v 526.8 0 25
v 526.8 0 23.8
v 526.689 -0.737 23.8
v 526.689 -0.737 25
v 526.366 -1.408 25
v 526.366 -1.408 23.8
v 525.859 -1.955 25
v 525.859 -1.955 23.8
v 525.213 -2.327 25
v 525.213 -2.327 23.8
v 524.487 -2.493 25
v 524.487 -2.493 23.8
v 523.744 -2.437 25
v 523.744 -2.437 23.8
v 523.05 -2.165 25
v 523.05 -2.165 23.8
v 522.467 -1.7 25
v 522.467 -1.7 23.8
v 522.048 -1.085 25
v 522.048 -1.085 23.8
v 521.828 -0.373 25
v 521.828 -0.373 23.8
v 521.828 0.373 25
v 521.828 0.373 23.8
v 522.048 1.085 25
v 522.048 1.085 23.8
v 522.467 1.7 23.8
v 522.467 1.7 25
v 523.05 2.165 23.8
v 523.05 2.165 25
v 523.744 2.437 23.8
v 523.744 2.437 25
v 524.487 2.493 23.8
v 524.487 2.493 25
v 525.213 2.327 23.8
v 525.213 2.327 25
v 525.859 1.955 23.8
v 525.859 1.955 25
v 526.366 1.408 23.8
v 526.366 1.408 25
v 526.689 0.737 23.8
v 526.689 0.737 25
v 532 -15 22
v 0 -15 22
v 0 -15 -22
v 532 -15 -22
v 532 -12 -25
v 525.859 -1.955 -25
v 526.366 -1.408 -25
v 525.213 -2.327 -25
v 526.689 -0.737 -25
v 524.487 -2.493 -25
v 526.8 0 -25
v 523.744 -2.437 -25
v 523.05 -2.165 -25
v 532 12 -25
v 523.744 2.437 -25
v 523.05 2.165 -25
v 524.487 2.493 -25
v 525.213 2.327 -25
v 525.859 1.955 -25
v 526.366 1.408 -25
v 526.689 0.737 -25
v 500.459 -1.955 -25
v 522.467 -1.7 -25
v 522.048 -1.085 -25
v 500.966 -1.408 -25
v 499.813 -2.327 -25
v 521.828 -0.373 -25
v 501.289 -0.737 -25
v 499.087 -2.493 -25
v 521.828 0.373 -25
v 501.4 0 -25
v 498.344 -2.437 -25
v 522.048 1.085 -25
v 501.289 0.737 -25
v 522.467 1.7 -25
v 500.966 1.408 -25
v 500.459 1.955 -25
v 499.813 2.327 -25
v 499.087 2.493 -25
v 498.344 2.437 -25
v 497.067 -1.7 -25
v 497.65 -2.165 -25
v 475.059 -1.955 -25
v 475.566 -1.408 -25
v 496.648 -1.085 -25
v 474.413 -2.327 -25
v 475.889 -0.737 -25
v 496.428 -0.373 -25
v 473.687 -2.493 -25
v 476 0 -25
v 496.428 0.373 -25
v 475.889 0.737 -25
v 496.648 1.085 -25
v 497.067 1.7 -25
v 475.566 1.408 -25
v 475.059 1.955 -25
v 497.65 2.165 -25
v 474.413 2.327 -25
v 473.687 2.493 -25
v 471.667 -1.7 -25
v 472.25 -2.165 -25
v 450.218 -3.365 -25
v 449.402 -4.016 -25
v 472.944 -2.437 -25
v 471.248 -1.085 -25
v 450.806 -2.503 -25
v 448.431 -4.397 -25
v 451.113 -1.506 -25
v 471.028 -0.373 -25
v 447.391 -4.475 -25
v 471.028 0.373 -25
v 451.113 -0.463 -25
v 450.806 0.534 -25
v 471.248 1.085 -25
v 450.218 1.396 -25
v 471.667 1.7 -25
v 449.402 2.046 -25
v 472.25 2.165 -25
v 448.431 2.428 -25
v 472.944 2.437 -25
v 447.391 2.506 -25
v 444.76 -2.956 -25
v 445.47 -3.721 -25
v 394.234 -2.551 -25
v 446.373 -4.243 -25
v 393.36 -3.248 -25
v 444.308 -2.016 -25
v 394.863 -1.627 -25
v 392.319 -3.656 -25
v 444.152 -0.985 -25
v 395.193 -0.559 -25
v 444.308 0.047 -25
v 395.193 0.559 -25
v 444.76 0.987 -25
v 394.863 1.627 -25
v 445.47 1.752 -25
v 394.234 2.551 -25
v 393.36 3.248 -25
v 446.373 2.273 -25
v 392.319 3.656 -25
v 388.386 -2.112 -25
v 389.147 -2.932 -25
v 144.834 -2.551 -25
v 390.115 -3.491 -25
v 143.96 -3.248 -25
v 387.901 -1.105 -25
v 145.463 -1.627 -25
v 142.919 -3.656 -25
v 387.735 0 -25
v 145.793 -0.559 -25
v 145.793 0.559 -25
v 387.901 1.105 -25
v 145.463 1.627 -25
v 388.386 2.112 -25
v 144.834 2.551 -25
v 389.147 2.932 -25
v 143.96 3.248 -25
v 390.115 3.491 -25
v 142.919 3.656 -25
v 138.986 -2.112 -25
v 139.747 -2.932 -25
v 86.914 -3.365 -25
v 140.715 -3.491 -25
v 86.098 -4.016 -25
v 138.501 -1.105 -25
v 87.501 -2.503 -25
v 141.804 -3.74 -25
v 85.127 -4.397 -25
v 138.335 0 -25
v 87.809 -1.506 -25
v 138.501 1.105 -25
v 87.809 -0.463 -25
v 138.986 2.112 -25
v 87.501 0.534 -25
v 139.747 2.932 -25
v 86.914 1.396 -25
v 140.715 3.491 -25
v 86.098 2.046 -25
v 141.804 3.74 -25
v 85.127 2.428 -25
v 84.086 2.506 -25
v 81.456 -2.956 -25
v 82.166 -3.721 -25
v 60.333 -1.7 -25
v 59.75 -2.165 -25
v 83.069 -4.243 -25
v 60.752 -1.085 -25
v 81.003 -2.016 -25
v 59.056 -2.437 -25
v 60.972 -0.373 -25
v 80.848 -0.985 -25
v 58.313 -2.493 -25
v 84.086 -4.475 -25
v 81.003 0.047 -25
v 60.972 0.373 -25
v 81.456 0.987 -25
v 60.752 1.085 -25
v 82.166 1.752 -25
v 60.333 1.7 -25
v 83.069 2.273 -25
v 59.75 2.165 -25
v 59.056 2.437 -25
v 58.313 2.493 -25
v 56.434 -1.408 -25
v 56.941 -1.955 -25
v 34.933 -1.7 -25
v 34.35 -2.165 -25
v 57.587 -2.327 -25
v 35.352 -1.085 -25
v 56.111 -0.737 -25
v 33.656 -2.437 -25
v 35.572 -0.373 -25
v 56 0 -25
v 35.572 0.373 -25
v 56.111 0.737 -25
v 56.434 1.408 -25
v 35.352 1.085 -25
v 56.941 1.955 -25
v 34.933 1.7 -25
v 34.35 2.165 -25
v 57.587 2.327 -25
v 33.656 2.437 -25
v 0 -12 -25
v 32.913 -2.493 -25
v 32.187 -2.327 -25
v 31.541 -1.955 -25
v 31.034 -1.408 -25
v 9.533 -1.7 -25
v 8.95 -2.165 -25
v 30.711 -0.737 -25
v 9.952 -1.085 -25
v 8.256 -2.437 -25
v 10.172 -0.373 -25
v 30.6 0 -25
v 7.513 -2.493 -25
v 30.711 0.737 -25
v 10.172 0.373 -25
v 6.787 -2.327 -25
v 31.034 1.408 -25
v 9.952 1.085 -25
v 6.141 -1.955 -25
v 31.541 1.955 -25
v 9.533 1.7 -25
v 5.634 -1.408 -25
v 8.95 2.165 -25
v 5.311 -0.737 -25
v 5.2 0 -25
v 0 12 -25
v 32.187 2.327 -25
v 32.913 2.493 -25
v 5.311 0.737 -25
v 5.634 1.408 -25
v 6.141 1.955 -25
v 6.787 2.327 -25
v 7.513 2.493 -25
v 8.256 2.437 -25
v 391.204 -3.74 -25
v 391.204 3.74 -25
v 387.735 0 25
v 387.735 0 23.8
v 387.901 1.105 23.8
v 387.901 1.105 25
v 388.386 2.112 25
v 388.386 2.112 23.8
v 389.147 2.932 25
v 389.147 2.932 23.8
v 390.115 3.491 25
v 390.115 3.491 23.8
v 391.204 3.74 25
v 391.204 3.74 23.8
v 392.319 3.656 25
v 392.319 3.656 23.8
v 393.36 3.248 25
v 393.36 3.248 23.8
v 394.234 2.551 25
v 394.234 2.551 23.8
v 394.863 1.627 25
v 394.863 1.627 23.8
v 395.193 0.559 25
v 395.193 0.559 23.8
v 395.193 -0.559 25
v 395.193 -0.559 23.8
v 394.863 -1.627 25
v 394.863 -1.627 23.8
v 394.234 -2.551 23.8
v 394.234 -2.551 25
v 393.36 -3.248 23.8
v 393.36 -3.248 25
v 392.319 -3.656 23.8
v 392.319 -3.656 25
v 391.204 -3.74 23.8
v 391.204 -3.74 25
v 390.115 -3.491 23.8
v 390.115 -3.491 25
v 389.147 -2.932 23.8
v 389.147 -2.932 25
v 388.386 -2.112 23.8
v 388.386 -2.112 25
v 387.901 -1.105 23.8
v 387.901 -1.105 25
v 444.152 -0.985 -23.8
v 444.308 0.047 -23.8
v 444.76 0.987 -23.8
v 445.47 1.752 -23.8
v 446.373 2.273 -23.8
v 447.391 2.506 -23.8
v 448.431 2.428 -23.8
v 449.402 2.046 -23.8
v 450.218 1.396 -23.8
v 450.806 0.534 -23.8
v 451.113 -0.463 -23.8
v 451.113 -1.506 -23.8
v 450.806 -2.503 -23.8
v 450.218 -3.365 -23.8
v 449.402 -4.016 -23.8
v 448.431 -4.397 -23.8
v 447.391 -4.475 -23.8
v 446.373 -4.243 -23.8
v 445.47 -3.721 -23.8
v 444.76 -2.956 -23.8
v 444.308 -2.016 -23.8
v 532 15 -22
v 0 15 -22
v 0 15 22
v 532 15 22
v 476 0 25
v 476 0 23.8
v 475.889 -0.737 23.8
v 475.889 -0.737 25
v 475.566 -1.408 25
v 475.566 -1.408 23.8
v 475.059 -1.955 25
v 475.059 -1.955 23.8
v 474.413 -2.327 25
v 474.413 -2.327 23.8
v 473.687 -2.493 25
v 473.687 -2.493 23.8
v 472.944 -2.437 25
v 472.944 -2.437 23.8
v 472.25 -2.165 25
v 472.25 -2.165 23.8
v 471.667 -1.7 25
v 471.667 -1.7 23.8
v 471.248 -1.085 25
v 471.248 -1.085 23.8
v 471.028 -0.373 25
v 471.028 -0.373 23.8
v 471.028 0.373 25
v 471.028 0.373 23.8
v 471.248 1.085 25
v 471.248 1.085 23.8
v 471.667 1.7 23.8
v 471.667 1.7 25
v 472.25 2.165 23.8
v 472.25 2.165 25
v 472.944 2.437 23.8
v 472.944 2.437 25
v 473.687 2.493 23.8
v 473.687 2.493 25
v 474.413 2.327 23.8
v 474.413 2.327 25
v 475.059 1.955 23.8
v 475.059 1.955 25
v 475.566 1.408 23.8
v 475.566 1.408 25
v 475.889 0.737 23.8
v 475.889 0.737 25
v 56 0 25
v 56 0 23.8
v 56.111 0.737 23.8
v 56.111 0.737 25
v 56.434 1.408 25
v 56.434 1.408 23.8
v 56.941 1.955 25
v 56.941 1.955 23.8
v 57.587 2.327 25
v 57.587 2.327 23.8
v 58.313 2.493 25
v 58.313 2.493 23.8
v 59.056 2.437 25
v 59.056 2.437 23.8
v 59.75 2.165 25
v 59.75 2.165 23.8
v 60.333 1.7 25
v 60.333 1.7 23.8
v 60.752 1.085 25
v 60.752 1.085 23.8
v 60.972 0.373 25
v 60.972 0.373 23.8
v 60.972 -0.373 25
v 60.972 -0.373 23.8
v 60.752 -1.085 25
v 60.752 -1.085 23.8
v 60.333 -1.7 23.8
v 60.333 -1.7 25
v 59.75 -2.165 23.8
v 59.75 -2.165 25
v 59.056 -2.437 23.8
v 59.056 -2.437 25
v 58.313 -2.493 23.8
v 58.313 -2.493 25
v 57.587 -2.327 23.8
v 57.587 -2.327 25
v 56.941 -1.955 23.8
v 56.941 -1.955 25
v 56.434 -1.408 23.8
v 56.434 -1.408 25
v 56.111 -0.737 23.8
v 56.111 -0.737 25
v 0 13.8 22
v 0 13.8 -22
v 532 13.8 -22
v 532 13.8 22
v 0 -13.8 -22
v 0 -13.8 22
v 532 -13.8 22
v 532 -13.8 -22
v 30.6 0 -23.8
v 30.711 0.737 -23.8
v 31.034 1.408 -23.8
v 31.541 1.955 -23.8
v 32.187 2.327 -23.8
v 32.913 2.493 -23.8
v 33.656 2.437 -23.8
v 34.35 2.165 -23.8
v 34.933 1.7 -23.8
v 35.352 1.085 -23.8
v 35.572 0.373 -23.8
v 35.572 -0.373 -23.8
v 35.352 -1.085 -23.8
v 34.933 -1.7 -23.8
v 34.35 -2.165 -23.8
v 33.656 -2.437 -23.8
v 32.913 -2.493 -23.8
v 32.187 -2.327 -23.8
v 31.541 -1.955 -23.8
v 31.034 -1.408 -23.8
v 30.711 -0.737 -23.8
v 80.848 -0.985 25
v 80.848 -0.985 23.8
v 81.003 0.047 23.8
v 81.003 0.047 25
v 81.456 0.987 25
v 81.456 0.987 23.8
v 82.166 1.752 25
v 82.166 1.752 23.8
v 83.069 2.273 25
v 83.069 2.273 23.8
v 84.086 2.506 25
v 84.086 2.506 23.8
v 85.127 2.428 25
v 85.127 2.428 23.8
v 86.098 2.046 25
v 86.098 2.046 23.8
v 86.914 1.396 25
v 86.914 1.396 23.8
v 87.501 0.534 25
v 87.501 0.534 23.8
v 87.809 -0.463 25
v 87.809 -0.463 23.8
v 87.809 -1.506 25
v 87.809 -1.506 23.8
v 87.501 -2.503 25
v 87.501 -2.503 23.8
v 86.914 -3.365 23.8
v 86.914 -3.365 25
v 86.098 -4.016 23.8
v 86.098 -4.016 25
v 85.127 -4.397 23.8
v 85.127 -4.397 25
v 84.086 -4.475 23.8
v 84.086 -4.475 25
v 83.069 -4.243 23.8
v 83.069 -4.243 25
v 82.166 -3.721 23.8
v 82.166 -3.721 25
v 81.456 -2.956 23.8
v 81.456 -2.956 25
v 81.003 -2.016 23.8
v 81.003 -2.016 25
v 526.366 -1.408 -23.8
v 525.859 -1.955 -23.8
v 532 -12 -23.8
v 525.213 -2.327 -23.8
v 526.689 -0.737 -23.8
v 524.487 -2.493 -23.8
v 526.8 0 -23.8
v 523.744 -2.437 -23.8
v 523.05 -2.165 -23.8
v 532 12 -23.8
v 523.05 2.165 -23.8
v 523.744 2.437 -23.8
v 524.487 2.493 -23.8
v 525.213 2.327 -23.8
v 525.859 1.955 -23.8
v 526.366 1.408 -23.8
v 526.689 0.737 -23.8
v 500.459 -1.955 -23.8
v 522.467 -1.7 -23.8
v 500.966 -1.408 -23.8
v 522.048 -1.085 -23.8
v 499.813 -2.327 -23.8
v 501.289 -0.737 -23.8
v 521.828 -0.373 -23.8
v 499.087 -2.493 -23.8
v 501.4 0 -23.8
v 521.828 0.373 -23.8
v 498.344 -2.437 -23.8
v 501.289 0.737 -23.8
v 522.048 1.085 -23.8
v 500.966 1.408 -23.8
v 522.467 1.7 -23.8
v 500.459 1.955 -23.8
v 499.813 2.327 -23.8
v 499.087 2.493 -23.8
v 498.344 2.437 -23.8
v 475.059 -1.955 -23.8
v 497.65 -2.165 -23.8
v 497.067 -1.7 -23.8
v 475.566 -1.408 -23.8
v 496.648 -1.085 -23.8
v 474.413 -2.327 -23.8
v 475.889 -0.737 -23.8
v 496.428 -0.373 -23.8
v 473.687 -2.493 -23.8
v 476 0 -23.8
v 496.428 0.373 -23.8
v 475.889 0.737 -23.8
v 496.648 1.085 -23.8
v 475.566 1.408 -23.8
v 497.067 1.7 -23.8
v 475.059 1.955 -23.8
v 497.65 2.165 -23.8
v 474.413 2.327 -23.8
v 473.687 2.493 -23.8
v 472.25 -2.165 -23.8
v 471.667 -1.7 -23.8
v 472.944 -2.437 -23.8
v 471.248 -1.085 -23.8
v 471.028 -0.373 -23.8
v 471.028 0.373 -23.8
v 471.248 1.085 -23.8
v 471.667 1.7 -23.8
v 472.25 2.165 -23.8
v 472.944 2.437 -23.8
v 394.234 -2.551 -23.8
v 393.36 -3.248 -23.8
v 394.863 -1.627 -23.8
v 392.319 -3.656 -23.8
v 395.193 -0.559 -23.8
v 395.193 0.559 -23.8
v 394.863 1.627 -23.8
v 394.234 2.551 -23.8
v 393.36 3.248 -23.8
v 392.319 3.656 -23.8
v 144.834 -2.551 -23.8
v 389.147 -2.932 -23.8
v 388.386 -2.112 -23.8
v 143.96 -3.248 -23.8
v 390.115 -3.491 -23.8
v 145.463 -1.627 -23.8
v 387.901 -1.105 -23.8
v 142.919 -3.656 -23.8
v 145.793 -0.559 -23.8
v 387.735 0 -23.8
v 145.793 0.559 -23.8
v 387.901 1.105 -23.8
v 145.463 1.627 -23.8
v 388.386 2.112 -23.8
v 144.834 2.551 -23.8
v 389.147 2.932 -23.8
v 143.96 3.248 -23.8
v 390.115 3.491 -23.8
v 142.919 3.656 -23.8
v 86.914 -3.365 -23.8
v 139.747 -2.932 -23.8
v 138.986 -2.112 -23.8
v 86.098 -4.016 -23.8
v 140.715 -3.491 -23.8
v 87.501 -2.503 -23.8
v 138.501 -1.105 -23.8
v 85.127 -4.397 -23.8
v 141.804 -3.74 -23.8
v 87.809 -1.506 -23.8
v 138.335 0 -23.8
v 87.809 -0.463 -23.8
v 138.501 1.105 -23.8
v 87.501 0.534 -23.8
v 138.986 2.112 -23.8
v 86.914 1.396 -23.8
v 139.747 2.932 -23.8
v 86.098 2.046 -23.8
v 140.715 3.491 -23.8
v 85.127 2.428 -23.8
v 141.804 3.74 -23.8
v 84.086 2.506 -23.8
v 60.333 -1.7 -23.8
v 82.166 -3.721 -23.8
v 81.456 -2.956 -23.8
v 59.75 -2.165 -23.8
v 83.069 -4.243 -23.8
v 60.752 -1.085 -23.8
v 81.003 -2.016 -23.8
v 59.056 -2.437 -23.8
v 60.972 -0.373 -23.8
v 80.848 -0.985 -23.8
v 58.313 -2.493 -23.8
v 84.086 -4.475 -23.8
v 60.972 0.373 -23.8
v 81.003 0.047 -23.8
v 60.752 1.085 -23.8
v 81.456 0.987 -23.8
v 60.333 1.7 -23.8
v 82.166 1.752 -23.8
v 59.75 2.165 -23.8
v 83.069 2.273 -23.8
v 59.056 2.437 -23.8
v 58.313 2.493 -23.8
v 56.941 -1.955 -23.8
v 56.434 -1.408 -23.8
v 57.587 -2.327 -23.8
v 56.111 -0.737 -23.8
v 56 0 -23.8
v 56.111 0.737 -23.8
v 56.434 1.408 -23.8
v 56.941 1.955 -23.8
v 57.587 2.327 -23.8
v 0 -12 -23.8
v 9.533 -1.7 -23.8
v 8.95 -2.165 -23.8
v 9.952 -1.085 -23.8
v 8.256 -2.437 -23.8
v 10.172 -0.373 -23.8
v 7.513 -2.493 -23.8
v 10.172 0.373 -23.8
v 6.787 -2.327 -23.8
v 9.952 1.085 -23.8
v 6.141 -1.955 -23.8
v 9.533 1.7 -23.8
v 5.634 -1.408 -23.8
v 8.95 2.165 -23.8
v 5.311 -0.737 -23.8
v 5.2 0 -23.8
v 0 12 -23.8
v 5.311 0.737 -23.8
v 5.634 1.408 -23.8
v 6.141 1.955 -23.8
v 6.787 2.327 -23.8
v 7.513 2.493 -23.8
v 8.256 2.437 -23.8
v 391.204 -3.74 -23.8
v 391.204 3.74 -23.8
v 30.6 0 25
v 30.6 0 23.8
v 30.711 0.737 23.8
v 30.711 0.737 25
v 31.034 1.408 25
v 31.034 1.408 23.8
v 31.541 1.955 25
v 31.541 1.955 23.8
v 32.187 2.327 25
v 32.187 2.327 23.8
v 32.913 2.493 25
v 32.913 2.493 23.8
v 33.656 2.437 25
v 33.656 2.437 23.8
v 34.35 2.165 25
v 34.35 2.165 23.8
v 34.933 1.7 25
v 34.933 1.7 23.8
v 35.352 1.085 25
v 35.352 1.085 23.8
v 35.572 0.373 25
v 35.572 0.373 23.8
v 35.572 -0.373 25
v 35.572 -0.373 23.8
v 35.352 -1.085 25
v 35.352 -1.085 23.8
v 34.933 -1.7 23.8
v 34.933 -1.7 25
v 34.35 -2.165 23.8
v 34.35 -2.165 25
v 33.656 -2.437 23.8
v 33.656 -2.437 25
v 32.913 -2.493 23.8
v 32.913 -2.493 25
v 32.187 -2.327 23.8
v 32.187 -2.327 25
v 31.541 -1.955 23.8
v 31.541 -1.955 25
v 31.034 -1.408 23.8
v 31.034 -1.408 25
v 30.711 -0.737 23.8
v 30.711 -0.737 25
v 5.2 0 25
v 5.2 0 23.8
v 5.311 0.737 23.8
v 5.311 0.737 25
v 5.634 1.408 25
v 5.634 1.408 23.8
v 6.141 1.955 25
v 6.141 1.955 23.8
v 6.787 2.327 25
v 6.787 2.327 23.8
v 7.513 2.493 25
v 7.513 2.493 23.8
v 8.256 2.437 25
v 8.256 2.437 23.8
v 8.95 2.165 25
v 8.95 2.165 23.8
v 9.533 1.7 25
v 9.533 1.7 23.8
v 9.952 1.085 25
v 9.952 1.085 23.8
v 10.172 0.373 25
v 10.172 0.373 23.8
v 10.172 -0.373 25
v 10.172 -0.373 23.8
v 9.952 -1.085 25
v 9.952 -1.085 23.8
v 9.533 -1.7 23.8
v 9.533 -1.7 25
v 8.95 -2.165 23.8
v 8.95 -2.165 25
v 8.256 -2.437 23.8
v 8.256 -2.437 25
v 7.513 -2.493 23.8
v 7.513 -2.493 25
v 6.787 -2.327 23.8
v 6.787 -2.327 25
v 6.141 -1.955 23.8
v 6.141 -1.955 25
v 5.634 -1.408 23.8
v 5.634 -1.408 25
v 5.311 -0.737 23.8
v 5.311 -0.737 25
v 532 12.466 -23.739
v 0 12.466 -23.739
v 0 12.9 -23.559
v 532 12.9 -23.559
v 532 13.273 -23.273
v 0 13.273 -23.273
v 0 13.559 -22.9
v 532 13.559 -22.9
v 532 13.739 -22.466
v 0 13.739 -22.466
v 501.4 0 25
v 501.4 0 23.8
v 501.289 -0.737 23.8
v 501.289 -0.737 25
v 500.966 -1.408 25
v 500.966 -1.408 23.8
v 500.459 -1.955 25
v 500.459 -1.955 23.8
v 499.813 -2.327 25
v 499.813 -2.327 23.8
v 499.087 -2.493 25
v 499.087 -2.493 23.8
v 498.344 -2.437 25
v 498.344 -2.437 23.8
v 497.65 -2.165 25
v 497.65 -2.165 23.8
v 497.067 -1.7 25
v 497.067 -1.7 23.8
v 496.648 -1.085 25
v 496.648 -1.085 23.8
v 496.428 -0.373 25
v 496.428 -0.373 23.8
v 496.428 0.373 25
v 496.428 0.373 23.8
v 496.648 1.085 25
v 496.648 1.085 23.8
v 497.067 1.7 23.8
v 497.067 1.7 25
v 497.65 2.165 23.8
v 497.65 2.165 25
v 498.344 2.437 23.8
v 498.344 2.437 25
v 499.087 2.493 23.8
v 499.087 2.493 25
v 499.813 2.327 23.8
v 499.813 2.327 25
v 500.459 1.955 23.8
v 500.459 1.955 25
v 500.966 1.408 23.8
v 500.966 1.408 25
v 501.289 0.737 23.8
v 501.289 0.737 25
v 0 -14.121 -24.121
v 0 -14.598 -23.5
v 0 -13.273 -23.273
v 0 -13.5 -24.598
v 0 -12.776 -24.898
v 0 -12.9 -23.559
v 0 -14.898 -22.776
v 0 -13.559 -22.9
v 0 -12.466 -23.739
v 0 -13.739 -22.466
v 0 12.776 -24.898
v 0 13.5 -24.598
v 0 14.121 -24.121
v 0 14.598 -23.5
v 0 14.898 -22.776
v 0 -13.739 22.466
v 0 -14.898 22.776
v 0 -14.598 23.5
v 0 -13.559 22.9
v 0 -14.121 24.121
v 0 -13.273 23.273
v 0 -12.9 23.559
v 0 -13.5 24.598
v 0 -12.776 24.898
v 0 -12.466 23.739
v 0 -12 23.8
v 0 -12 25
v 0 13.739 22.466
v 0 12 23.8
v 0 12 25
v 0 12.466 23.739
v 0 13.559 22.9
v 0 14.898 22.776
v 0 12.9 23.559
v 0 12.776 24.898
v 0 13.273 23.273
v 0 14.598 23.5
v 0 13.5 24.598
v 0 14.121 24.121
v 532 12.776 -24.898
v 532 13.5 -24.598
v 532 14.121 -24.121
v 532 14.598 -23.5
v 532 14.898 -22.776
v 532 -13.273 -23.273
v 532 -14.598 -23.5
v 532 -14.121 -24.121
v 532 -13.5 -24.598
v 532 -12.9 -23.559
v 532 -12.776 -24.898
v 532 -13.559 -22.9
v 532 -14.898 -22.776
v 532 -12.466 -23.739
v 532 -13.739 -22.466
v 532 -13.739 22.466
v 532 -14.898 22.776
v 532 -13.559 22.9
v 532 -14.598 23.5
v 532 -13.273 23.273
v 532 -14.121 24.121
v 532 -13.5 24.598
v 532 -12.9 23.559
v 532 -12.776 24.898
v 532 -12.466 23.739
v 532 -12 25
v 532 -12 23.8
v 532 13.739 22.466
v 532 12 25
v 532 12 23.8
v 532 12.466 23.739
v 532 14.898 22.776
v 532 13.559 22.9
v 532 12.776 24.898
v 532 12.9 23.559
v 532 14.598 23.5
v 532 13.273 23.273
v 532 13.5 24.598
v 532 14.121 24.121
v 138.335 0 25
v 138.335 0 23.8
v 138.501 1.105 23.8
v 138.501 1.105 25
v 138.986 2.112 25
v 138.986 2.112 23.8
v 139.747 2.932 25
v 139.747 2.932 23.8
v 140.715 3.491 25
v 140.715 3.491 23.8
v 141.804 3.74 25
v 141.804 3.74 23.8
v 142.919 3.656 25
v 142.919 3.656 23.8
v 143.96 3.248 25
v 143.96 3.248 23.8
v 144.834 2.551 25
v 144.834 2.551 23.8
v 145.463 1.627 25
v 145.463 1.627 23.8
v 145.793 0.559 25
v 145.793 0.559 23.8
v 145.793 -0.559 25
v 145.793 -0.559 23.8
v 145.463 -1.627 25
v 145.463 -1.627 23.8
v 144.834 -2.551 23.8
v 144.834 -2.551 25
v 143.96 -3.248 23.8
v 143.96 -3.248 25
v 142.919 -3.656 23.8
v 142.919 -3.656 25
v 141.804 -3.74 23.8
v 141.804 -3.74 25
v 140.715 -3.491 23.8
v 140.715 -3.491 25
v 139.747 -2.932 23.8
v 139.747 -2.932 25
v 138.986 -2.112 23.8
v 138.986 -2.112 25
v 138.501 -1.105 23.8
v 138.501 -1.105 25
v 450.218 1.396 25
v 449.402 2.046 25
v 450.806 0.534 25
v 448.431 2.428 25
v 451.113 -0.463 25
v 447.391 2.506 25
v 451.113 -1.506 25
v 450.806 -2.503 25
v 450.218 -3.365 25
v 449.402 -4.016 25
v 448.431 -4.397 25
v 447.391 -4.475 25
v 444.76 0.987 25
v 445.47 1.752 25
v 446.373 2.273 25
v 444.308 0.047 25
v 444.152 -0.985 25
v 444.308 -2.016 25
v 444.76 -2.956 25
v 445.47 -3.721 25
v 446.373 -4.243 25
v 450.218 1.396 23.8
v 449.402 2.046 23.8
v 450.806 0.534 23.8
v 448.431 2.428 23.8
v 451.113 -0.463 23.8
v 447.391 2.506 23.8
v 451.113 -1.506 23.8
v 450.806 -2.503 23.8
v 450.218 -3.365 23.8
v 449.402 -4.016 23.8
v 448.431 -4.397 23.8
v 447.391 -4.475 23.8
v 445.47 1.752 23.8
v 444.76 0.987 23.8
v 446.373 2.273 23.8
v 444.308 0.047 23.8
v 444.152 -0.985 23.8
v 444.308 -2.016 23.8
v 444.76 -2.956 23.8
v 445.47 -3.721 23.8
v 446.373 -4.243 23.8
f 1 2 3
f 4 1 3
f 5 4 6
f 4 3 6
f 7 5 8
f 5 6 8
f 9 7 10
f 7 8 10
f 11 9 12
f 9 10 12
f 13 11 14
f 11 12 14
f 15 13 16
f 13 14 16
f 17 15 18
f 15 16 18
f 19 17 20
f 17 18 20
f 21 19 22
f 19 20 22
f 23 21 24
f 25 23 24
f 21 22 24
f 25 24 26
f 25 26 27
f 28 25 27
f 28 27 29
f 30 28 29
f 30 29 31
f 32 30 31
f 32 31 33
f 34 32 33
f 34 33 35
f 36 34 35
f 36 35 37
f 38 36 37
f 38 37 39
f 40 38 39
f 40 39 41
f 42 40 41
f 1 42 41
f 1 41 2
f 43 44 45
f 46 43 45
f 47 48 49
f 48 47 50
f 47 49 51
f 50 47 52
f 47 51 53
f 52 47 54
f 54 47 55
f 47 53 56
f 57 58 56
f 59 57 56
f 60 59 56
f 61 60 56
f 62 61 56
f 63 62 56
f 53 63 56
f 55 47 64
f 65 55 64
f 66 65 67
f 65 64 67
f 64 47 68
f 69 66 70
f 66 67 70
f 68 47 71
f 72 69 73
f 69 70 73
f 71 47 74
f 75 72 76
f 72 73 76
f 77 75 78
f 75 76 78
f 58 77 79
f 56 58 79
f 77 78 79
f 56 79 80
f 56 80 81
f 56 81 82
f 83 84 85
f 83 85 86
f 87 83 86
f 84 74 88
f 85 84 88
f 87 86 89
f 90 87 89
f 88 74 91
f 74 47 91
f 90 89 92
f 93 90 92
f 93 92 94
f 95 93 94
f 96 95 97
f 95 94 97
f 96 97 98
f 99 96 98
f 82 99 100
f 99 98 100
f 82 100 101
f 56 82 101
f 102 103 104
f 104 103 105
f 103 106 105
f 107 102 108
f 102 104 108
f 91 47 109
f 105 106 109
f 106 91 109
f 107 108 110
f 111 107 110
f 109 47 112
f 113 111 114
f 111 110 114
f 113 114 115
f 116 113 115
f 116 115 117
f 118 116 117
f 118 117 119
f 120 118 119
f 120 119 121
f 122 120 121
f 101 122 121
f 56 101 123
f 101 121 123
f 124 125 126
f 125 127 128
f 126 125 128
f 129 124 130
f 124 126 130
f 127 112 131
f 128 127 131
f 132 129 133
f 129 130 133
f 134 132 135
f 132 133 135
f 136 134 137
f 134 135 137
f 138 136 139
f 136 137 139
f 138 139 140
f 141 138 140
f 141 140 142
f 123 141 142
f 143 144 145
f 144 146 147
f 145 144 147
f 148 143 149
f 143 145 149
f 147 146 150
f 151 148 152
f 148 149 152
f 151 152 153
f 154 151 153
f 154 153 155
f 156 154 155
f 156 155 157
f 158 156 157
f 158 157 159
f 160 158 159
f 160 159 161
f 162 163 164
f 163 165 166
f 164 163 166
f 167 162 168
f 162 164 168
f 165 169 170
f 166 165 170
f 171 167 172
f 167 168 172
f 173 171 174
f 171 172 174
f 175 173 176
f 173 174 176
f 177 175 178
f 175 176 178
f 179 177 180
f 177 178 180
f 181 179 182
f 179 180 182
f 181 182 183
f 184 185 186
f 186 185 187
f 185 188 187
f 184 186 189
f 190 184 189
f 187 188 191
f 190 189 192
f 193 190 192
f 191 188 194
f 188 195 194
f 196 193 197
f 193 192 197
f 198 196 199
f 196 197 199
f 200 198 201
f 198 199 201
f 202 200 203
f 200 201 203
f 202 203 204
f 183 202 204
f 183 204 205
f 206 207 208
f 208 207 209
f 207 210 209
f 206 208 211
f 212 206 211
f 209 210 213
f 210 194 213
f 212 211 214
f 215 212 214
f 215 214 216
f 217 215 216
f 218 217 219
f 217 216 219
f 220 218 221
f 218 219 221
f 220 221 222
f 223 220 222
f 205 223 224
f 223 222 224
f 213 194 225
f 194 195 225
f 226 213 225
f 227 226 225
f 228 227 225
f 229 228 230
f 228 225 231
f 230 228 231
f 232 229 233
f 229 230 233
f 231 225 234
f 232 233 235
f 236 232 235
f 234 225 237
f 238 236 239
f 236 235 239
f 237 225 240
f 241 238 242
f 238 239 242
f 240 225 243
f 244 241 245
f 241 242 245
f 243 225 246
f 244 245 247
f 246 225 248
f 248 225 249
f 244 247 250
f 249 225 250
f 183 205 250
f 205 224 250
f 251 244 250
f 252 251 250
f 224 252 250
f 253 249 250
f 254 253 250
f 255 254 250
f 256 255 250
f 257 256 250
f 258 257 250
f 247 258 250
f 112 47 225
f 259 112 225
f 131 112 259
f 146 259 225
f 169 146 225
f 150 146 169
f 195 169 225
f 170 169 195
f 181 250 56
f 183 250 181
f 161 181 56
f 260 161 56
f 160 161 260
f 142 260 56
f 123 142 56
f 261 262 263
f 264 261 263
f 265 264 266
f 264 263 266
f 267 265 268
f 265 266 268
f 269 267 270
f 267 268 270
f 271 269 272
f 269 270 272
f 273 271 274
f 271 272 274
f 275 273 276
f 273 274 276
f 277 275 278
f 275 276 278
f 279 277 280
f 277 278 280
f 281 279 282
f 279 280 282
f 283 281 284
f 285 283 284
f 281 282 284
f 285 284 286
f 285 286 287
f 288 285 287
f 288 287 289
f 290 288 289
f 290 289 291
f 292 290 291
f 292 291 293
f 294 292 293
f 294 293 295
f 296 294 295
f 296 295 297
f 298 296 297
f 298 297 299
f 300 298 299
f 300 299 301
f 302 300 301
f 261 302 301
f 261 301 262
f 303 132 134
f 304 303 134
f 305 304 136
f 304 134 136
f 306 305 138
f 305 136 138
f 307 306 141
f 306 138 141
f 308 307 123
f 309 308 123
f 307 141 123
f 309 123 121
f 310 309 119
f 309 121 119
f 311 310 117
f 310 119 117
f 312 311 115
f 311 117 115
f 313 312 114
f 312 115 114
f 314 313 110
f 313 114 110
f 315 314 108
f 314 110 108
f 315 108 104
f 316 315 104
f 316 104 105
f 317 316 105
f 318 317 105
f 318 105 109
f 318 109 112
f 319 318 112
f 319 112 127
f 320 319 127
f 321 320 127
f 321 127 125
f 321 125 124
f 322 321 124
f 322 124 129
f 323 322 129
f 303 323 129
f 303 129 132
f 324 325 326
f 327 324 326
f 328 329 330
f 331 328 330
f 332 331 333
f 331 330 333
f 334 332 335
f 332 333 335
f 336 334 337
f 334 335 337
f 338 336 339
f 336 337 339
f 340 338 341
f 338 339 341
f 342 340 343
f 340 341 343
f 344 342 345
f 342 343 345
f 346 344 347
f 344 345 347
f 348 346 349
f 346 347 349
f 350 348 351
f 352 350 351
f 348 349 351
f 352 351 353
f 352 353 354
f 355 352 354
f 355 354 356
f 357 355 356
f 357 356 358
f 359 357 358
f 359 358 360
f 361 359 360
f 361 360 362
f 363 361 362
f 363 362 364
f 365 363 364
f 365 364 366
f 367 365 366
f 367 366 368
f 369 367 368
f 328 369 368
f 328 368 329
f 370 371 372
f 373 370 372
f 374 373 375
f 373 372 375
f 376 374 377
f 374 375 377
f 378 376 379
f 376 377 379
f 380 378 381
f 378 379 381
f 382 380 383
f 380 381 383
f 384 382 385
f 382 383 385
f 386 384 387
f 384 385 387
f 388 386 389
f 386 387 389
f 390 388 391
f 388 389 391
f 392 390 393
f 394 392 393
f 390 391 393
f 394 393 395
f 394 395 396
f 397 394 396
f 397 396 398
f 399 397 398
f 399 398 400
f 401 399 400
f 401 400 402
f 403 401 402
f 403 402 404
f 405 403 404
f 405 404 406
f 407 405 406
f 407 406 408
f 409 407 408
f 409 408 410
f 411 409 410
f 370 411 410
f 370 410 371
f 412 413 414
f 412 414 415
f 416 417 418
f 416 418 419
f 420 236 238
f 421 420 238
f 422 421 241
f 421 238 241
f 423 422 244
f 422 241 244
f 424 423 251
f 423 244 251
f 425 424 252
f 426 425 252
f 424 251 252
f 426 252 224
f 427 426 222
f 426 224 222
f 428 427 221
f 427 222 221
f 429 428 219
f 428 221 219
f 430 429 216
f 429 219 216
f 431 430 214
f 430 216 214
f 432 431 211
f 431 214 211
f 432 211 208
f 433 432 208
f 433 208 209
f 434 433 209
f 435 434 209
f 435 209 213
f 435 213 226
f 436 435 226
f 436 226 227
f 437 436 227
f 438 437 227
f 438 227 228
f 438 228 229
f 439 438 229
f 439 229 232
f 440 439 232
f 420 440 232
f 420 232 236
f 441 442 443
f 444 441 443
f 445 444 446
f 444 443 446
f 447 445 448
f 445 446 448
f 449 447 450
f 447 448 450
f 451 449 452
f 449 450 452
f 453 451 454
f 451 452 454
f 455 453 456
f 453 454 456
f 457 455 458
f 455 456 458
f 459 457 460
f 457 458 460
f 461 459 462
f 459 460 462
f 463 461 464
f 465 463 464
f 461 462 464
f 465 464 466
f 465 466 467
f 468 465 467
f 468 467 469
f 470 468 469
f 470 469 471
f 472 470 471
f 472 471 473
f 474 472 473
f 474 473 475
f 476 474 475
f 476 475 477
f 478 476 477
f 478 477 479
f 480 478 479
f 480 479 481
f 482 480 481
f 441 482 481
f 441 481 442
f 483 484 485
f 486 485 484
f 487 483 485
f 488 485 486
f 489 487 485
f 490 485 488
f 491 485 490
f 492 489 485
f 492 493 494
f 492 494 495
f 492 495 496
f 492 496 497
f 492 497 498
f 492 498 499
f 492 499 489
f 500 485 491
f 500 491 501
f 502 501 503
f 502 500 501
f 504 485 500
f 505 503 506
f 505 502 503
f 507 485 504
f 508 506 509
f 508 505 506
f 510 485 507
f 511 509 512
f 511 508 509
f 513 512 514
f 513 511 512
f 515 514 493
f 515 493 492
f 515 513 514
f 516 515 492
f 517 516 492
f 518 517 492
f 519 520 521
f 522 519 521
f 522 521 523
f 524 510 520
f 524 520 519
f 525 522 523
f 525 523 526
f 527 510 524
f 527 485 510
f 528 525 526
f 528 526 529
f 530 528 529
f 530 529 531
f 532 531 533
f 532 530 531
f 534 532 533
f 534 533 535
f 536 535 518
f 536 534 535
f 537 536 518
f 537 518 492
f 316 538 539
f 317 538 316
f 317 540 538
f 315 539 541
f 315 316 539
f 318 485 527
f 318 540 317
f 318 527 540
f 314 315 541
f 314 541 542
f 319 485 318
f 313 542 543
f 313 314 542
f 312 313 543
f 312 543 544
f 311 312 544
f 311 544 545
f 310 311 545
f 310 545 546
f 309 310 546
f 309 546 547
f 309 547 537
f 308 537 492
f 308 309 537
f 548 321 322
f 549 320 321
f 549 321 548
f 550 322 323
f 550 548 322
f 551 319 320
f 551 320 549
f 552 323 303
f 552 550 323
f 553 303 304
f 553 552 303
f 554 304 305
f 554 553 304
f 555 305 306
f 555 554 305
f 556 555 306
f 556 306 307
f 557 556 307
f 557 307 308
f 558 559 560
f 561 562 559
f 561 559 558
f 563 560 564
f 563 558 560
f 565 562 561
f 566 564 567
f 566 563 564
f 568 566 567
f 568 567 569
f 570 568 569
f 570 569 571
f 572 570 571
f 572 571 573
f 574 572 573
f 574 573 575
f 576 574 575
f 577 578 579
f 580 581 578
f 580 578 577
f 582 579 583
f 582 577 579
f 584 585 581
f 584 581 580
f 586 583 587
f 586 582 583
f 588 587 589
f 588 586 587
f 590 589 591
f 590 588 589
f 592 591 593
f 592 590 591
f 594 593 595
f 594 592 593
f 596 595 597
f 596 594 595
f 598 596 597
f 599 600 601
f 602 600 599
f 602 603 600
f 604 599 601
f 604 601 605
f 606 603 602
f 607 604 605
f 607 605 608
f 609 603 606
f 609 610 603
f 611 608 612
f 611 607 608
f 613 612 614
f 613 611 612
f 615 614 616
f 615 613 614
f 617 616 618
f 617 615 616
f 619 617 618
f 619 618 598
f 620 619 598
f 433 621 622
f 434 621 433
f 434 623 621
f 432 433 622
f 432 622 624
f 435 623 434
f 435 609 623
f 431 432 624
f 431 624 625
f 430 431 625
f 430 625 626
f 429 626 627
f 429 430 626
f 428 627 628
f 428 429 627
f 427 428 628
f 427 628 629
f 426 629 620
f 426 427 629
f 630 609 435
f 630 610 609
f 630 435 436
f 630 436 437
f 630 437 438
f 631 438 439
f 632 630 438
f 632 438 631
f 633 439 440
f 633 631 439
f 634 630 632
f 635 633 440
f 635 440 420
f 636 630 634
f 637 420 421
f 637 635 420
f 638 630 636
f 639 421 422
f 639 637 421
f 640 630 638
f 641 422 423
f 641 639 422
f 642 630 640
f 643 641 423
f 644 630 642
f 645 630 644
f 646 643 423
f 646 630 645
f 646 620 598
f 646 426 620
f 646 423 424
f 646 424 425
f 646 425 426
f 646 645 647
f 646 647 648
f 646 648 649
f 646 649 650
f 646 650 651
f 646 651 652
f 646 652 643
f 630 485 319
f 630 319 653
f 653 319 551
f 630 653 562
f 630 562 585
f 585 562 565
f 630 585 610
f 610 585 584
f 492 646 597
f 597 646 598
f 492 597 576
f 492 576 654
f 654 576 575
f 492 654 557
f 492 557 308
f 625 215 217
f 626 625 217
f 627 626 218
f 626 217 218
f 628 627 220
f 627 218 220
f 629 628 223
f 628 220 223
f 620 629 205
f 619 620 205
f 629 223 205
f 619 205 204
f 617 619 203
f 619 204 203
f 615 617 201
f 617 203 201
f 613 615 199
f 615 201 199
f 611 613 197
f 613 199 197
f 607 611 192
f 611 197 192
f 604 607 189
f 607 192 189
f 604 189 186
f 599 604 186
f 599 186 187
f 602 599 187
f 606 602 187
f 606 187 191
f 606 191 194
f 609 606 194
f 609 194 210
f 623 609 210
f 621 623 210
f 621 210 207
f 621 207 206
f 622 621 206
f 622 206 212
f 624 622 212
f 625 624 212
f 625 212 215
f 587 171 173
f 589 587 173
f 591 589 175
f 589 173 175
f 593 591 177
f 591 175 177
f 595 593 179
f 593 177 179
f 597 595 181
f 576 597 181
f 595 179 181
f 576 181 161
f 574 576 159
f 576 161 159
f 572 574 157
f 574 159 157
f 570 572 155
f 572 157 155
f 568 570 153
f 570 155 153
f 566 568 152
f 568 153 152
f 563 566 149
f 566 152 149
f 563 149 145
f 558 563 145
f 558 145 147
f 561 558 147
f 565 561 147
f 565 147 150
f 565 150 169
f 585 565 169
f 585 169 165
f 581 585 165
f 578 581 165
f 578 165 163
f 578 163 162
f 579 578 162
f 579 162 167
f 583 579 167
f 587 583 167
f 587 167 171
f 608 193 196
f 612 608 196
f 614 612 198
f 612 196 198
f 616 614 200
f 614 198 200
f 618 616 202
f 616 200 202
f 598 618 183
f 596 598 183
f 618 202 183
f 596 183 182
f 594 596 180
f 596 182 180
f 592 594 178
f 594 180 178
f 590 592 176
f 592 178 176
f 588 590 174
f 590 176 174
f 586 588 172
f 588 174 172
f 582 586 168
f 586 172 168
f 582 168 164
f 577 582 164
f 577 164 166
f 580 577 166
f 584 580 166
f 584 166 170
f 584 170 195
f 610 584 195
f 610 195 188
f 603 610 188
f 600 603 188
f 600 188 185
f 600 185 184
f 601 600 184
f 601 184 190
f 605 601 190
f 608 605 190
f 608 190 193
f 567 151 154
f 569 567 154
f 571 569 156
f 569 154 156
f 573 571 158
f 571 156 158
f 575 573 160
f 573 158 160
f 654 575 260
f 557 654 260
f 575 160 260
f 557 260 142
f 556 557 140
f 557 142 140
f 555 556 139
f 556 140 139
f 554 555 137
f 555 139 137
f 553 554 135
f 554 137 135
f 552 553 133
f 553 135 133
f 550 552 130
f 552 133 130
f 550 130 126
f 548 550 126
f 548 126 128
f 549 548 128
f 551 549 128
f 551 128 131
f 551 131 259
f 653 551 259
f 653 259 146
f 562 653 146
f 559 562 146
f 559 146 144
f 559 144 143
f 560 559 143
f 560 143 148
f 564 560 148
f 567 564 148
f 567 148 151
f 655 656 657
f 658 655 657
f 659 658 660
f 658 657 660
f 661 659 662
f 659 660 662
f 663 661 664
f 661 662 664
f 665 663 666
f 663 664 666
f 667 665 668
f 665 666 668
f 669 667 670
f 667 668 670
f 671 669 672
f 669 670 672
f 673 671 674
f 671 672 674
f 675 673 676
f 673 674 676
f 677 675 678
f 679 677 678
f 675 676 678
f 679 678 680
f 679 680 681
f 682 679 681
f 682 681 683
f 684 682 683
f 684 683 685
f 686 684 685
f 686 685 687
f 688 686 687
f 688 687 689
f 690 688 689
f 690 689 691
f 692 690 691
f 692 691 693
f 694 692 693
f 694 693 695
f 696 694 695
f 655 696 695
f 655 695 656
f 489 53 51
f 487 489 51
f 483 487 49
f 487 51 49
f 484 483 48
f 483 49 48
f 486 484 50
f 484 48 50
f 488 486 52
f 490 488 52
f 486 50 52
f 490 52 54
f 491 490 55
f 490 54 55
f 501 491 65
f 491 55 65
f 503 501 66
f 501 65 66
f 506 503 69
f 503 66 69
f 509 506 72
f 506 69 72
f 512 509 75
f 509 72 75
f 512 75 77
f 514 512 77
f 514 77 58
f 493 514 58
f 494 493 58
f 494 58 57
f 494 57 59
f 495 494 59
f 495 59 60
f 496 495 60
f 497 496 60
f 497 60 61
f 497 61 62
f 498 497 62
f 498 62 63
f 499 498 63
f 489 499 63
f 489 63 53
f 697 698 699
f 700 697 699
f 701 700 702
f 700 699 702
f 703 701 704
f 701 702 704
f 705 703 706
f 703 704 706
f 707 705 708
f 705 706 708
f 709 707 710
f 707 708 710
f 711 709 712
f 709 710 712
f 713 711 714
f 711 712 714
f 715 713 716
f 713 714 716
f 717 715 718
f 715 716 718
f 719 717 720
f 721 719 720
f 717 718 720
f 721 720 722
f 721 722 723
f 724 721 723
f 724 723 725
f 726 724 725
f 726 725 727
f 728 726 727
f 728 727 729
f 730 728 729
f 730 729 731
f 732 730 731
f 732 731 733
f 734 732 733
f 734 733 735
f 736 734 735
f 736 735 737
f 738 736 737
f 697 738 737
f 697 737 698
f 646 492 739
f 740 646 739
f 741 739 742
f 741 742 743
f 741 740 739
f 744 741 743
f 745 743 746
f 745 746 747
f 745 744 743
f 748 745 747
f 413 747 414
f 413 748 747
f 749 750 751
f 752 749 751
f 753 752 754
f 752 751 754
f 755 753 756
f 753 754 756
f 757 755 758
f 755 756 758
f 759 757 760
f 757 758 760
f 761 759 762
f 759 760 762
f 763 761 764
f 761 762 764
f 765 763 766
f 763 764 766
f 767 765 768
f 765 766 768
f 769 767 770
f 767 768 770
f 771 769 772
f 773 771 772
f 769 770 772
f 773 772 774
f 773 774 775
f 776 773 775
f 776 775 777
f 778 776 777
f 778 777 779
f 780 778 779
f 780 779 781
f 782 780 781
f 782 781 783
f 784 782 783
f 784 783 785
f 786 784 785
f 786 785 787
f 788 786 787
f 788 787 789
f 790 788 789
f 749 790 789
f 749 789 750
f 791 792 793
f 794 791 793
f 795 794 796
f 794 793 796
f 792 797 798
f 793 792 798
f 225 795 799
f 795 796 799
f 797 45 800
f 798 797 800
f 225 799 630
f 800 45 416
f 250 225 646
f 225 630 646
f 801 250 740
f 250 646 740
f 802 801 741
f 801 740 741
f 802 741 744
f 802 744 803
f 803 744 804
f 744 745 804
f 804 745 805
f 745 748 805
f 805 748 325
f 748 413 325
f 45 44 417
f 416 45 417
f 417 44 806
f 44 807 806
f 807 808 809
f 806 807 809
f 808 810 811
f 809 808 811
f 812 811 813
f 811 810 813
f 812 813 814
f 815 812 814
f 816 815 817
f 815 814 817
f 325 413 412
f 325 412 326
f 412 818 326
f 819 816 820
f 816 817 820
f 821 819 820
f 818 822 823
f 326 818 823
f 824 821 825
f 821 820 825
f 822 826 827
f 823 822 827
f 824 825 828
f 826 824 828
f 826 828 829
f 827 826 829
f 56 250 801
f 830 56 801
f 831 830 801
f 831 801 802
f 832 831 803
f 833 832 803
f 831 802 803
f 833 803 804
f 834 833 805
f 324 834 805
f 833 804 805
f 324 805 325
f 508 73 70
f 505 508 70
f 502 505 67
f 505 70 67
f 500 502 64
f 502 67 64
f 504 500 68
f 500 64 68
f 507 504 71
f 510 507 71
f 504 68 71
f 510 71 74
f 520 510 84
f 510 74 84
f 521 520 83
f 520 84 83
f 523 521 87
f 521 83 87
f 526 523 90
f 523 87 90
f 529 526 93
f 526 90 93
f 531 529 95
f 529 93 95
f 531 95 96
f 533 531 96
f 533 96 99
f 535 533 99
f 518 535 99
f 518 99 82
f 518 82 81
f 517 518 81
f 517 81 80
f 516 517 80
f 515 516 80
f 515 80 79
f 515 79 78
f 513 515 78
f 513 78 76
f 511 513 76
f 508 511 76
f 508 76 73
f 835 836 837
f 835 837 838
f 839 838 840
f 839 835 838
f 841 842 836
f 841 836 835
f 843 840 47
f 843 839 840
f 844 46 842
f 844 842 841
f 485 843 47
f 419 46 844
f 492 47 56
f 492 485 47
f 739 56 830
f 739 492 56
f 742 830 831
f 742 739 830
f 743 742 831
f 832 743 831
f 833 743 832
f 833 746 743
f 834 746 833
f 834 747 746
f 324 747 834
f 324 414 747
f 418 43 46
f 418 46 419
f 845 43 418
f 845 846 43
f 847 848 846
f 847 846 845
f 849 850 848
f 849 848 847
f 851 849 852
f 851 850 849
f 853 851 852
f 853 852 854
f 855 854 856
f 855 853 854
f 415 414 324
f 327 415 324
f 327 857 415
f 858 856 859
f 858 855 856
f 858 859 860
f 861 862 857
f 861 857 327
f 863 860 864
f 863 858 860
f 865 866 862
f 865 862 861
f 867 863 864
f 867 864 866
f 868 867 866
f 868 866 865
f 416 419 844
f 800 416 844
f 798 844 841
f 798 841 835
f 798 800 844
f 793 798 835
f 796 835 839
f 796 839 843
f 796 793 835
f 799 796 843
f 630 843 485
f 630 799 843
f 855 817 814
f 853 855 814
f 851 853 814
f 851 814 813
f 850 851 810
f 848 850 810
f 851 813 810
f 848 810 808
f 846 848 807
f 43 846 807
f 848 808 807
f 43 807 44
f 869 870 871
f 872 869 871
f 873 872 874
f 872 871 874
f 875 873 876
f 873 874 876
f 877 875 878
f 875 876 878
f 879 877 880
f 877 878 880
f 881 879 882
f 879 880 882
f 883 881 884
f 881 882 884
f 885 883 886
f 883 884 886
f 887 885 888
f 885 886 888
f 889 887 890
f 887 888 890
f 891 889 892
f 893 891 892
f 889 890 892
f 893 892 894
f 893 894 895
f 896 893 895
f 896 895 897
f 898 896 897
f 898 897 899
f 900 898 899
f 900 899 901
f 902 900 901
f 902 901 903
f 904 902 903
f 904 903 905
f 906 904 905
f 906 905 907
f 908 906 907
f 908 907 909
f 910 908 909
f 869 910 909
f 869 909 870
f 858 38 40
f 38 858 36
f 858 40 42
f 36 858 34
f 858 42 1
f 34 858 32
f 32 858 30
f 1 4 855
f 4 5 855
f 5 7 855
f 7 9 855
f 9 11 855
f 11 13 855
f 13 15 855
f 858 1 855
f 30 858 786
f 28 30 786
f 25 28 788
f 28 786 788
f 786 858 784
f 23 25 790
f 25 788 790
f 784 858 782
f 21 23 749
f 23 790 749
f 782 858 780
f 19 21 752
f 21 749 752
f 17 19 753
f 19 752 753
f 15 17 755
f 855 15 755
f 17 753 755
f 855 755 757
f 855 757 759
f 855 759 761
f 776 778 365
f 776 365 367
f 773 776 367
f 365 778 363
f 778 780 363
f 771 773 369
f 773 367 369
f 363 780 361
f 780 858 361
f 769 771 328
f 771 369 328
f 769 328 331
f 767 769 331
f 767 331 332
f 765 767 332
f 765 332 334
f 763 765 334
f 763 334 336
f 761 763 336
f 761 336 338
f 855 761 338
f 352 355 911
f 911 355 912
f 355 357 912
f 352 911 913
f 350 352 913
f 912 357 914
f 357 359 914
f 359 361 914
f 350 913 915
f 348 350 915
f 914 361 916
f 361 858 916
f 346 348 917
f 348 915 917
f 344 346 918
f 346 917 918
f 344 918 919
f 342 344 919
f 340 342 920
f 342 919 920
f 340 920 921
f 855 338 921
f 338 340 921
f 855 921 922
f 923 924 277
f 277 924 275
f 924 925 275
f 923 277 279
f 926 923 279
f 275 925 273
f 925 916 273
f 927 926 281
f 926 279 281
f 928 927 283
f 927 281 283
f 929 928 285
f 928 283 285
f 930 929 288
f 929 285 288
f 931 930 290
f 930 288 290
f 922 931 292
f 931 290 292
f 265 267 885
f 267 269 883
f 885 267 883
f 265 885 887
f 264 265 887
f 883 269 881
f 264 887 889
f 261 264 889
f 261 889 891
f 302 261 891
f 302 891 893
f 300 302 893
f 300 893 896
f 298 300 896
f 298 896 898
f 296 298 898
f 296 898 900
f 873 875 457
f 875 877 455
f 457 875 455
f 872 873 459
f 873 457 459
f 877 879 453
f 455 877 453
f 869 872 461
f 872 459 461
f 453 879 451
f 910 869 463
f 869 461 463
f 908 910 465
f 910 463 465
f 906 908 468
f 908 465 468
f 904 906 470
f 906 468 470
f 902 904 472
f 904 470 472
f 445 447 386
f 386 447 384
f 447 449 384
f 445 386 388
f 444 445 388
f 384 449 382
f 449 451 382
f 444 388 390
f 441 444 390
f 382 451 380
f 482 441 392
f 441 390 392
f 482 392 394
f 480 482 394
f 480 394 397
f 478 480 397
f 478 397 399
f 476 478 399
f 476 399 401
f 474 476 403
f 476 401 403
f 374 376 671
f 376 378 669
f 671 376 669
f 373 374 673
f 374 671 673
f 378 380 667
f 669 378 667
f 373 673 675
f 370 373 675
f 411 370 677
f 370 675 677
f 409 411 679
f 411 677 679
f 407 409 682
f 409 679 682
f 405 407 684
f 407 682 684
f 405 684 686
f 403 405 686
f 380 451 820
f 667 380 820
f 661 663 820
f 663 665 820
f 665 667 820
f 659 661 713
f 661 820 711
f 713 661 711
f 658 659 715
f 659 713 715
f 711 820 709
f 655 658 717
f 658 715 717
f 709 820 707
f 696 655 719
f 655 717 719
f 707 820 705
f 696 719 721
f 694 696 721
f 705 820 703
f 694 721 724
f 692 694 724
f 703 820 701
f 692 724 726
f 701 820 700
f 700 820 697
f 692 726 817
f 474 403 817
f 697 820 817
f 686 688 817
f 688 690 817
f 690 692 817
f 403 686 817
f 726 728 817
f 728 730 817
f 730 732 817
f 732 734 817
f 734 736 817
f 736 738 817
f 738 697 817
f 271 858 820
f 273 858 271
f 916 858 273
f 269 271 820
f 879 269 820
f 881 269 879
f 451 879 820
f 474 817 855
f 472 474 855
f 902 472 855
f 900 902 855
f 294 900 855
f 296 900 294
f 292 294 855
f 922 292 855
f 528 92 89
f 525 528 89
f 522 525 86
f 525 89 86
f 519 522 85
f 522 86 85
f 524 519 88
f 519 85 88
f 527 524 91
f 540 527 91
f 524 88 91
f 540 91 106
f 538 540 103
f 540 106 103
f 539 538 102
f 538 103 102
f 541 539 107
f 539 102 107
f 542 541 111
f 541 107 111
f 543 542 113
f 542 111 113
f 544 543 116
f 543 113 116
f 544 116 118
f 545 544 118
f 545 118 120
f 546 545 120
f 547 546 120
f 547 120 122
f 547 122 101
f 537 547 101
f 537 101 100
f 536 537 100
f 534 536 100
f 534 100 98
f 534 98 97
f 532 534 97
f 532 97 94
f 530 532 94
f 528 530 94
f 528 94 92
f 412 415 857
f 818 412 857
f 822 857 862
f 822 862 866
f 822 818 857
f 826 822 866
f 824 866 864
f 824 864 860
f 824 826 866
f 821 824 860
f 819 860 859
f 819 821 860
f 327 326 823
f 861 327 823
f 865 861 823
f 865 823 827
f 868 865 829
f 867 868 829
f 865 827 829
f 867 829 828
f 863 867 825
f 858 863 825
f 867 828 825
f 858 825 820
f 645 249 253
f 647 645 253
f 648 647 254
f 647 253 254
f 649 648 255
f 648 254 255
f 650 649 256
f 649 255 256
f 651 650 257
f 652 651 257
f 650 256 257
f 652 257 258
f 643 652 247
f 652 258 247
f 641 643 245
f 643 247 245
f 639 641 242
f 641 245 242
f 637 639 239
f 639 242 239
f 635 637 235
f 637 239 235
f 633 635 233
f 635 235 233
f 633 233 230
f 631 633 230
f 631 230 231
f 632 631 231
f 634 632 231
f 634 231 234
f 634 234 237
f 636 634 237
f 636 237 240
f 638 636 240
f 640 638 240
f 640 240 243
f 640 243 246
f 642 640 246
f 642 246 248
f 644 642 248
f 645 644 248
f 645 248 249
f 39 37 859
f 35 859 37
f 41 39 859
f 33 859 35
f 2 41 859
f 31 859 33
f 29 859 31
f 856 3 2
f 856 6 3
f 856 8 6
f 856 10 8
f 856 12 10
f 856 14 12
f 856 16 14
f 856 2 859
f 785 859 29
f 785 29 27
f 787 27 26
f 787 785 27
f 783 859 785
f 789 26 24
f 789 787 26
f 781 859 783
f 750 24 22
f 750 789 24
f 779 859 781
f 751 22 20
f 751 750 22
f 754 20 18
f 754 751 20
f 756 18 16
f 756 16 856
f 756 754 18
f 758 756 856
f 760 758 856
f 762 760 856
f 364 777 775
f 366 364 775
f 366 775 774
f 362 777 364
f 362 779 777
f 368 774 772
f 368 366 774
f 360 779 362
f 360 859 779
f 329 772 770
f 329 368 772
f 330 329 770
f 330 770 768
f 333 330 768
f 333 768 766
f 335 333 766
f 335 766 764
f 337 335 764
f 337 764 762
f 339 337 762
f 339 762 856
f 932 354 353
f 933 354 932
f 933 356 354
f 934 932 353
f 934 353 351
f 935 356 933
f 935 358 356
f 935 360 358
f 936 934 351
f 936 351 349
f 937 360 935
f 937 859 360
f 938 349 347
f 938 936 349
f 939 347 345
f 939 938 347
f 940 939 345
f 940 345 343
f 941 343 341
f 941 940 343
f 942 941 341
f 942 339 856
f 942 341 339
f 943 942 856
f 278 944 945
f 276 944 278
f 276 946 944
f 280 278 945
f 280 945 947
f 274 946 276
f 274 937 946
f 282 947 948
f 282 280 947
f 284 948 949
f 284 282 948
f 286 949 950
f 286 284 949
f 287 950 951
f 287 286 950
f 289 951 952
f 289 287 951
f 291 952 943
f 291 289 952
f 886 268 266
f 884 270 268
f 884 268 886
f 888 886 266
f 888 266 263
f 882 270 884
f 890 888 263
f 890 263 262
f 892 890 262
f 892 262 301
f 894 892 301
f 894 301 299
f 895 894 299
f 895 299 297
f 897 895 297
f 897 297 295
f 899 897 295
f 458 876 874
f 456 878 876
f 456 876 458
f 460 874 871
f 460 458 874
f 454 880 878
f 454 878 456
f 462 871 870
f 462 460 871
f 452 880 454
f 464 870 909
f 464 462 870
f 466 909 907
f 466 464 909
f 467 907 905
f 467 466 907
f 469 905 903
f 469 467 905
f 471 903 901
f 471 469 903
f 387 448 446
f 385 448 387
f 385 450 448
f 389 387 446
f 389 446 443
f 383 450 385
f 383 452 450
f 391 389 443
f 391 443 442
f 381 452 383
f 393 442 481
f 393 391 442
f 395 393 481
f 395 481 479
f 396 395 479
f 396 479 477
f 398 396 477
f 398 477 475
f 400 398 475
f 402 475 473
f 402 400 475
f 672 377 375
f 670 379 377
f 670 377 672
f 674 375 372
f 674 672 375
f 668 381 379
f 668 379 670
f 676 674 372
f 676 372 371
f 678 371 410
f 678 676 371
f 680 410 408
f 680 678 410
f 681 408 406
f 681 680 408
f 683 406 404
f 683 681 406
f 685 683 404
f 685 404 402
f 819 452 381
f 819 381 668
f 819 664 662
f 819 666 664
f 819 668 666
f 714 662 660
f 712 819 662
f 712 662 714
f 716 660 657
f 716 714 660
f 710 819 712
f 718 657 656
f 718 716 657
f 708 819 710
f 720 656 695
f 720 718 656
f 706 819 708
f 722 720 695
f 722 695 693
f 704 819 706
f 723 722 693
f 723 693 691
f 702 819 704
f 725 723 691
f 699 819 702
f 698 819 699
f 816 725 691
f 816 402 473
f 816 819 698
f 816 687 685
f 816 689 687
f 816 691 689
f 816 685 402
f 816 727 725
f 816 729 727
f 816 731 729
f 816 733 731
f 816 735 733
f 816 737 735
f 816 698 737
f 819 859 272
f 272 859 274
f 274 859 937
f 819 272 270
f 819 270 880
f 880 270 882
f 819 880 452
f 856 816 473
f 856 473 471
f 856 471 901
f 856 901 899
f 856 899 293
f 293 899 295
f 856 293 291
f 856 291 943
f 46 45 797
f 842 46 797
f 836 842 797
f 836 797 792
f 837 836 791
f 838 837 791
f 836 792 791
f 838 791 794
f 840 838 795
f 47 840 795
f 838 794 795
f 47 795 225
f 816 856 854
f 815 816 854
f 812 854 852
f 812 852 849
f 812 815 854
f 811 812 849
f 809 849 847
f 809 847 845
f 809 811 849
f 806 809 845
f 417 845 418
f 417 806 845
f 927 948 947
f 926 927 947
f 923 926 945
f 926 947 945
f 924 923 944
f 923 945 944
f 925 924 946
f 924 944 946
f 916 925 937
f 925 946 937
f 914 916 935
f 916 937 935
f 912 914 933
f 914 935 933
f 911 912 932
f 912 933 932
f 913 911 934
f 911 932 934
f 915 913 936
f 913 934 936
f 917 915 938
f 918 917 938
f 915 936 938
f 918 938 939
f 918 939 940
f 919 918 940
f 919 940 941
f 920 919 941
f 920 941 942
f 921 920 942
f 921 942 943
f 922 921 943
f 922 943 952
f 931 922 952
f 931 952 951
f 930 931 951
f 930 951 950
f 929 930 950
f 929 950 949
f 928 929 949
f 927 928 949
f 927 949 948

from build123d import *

# Parameters (mm, degrees)
TUBO_RETANGULAR_50_X_30_X_2_6_1_DEPTH = 532
ESBO_O2_R                             = 2.5
CORTE_EXTRUS_O1_DEPTH                 = 535.554955079
ESBO_O5_R                             = 3.75
CORTE_EXTRUS_O4_DEPTH                 = 535.554955079
ESBO_O6_R                             = 3.5
CORTE_EXTRUS_O5_DEPTH                 = 535.554955079


with BuildPart() as part:
    # Sketch1 → Tubo retangular 50 X 30 X 2.6(1) (new body)
    with BuildSketch(Plane.YZ):
        with BuildLine():
            Line((-12, -25), (12, -25))
            ThreePointArc((12, -25), (14.121320344, -24.121320344), (15, -22))
            Line((15, -22), (15, 22))
            ThreePointArc((15, 22), (14.121320344, 24.121320344), (12, 25))
            Line((12, 25), (-12, 25))
            ThreePointArc((-12, 25), (-14.121320344, 24.121320344), (-15, 22))
            Line((-15, 22), (-15, -22))
            ThreePointArc((-15, -22), (-14.121320344, -24.121320344), (-12, -25))
        make_face()
        with BuildLine():
            Line((-12, -23.8), (12, -23.8))
            ThreePointArc((12, -23.8), (13.272792206, -23.272792206), (13.8, -22))
            Line((13.8, -22), (13.8, 22))
            ThreePointArc((13.8, 22), (13.272792206, 23.272792206), (12, 23.8))
            Line((12, 23.8), (-12, 23.8))
            ThreePointArc((-12, 23.8), (-13.272792206, 23.272792206), (-13.8, 22))
            Line((-13.8, 22), (-13.8, -22))
            ThreePointArc((-13.8, -22), (-13.272792206, -23.272792206), (-12, -23.8))
        make_face(mode=Mode.SUBTRACT)
    extrude(amount=TUBO_RETANGULAR_50_X_30_X_2_6_1_DEPTH)

    # Esboço2 → Corte-extrusão1 (cut, through all)
    with BuildSketch(Plane(origin=(0, 0, -25), x_dir=(-1, 0, 0), z_dir=(0, 0, -1))):
        with Locations((-58.5, 0)):
            Circle(ESBO_O2_R)
        with Locations((-33.1, 0)):
            Circle(ESBO_O2_R)
        with Locations((-7.7, 0)):
            Circle(ESBO_O2_R)
        with Locations(Location((-524.3, 0, 0), (0, 0, 180))):
            Circle(ESBO_O2_R)
        with Locations(Location((-498.9, 0, 0), (0, 0, 180))):
            Circle(ESBO_O2_R)
        with Locations(Location((-473.5, 0, 0), (0, 0, 180))):
            Circle(ESBO_O2_R)
    extrude(amount=-CORTE_EXTRUS_O1_DEPTH, mode=Mode.SUBTRACT)

    # Esboço5 → Corte-extrusão4 (cut, through all)
    with BuildSketch(Plane(origin=(0, 0, -25), x_dir=(-1, 0, 0), z_dir=(0, 0, -1))):
        with Locations((-391.484705047, 0)):
            Circle(ESBO_O5_R)
        with Locations((-142.084705047, 0)):
            Circle(ESBO_O5_R)
    extrude(amount=-CORTE_EXTRUS_O4_DEPTH, mode=Mode.SUBTRACT)

    # Esboço6 → Corte-extrusão5 (cut, through all)
    with BuildSketch(Plane(origin=(0, 0, -25), x_dir=(-1, 0, 0), z_dir=(0, 0, -1))):
        with Locations((-447.652173256, -0.984705047)):
            Circle(ESBO_O6_R)
        with Locations((-84.347826744, -0.984705047)):
            Circle(ESBO_O6_R)
    extrude(amount=-CORTE_EXTRUS_O5_DEPTH, mode=Mode.SUBTRACT)


solid = part.part
